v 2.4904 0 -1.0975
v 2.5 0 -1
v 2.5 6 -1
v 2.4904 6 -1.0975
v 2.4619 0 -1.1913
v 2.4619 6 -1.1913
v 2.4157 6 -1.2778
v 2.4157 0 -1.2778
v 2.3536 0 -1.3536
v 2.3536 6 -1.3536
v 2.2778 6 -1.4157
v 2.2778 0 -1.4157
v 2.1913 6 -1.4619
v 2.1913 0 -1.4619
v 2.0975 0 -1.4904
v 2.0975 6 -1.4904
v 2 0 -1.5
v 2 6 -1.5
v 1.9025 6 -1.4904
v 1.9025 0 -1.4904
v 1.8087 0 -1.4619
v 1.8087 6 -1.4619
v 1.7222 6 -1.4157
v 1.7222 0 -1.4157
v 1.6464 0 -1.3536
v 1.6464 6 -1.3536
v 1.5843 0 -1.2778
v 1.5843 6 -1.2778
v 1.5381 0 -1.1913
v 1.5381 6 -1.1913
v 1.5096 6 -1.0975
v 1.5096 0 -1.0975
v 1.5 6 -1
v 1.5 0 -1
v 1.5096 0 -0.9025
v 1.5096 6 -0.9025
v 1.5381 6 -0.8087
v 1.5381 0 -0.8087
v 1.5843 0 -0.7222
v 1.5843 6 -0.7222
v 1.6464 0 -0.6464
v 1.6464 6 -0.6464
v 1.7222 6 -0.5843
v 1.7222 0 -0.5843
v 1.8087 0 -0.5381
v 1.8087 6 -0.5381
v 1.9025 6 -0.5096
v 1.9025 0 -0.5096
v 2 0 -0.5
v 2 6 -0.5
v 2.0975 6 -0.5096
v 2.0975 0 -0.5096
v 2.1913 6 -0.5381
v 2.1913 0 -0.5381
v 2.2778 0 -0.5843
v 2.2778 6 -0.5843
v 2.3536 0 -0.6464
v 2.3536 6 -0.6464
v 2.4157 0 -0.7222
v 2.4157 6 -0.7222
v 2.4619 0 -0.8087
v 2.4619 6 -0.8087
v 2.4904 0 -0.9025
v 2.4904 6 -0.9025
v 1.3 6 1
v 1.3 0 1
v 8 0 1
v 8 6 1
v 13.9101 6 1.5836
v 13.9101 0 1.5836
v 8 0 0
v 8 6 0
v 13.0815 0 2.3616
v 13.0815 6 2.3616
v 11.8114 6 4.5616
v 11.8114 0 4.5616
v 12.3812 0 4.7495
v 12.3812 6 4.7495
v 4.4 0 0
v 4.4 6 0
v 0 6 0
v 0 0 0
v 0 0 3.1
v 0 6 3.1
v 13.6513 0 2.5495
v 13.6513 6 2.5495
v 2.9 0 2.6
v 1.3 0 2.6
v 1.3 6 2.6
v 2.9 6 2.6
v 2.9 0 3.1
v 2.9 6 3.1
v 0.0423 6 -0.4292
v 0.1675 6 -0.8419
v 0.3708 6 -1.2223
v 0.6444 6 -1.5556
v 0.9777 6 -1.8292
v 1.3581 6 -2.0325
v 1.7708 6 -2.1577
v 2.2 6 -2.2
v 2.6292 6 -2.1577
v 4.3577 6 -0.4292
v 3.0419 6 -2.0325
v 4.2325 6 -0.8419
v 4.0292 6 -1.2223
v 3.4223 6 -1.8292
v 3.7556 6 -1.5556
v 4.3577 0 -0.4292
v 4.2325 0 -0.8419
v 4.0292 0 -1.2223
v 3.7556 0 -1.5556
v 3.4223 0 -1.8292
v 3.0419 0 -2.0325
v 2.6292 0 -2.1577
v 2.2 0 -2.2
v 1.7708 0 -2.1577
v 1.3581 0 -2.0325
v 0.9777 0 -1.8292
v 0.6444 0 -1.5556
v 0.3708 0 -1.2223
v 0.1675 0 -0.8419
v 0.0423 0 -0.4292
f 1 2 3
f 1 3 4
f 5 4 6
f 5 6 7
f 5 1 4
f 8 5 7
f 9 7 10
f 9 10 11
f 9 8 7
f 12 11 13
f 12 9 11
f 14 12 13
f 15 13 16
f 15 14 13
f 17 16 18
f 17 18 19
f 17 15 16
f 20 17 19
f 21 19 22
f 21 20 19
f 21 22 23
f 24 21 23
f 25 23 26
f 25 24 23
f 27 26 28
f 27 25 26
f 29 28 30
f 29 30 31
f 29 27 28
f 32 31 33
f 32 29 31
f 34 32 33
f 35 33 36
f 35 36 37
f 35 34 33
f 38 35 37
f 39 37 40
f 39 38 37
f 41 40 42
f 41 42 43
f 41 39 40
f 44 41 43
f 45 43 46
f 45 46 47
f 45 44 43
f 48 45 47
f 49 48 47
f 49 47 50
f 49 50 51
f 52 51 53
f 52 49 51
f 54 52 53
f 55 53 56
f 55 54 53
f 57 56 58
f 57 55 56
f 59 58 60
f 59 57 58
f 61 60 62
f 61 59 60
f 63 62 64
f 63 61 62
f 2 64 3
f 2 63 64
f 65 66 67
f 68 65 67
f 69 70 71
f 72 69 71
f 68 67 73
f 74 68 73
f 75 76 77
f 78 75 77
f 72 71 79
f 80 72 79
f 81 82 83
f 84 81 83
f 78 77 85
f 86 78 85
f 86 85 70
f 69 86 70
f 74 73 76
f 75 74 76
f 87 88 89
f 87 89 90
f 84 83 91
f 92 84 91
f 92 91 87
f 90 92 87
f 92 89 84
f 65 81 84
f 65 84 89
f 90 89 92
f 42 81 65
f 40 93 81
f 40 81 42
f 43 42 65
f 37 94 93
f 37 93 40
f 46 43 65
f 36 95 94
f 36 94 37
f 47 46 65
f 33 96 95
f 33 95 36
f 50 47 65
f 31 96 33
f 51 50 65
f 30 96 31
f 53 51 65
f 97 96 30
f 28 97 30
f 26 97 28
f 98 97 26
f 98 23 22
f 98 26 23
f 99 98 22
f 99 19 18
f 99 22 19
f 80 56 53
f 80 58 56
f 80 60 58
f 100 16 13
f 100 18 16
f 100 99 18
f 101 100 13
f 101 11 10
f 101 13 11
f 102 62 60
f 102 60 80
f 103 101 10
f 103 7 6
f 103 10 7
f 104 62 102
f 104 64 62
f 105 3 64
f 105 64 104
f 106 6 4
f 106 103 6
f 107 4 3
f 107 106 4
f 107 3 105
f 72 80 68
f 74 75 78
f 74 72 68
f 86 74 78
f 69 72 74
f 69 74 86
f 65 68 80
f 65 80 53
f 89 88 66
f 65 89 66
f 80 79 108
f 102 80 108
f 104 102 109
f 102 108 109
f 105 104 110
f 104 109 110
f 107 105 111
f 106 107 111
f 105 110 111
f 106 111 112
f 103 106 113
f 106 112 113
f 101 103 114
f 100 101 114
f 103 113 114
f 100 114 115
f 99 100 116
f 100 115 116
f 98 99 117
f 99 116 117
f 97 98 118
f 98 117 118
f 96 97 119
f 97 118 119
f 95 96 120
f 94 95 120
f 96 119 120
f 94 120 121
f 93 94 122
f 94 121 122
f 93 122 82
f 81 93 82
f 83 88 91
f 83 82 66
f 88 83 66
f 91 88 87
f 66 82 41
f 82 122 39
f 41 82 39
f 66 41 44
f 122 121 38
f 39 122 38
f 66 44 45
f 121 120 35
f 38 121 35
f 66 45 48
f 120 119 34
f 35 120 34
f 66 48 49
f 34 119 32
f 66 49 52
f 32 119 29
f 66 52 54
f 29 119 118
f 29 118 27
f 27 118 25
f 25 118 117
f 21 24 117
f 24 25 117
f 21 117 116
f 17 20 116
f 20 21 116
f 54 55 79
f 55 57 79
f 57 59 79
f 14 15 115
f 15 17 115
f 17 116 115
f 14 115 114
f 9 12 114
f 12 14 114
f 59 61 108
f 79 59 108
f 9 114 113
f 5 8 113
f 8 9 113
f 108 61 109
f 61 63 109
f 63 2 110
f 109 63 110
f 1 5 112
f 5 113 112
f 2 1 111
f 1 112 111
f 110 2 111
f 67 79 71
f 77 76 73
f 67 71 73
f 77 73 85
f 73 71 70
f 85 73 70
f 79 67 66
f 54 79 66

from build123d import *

# Parameters (mm, degrees)
SKETCH1_R           = 0.5
SKETCH1_W           = 1.6
SKETCH1_H           = 0.5
BOSS_EXTRUDE1_DEPTH = 6


with BuildPart() as part:
    # Sketch1 → Boss-Extrude1 (new body)
    with BuildSketch(Plane(origin=(0, 0, 0), x_dir=(1, 0, 0), z_dir=(0, 1, 0))):
        Polygon((4.4, 0), (0, 0), (0, -1), (1.3, -1), (8, -1), (13.081525469, -2.361590646), (13.651326592, -2.549544577), (13.910145637, -1.583618751), (8, 0), align=None)
        Polygon((1.3, -1), (0, -1), (0, -3.1), (1.3, -3.1), (1.3, -2.6), align=None)
        Polygon((12.381156, -4.749544577), (13.651326592, -2.549544577), (13.081525469, -2.361590646), (11.811354877, -4.561590646), align=None)
        with BuildLine():
            ThreePointArc((4.4, 0), (2.2, 2.2), (0, 0))
            Line((0, 0), (4.4, 0))
        make_face()
        with Locations((2, 1)):
            Circle(SKETCH1_R, mode=Mode.SUBTRACT)
        with Locations((2.1, -2.85)):
            Rectangle(SKETCH1_W, SKETCH1_H)
    extrude(amount=BOSS_EXTRUDE1_DEPTH)


solid = part.part
